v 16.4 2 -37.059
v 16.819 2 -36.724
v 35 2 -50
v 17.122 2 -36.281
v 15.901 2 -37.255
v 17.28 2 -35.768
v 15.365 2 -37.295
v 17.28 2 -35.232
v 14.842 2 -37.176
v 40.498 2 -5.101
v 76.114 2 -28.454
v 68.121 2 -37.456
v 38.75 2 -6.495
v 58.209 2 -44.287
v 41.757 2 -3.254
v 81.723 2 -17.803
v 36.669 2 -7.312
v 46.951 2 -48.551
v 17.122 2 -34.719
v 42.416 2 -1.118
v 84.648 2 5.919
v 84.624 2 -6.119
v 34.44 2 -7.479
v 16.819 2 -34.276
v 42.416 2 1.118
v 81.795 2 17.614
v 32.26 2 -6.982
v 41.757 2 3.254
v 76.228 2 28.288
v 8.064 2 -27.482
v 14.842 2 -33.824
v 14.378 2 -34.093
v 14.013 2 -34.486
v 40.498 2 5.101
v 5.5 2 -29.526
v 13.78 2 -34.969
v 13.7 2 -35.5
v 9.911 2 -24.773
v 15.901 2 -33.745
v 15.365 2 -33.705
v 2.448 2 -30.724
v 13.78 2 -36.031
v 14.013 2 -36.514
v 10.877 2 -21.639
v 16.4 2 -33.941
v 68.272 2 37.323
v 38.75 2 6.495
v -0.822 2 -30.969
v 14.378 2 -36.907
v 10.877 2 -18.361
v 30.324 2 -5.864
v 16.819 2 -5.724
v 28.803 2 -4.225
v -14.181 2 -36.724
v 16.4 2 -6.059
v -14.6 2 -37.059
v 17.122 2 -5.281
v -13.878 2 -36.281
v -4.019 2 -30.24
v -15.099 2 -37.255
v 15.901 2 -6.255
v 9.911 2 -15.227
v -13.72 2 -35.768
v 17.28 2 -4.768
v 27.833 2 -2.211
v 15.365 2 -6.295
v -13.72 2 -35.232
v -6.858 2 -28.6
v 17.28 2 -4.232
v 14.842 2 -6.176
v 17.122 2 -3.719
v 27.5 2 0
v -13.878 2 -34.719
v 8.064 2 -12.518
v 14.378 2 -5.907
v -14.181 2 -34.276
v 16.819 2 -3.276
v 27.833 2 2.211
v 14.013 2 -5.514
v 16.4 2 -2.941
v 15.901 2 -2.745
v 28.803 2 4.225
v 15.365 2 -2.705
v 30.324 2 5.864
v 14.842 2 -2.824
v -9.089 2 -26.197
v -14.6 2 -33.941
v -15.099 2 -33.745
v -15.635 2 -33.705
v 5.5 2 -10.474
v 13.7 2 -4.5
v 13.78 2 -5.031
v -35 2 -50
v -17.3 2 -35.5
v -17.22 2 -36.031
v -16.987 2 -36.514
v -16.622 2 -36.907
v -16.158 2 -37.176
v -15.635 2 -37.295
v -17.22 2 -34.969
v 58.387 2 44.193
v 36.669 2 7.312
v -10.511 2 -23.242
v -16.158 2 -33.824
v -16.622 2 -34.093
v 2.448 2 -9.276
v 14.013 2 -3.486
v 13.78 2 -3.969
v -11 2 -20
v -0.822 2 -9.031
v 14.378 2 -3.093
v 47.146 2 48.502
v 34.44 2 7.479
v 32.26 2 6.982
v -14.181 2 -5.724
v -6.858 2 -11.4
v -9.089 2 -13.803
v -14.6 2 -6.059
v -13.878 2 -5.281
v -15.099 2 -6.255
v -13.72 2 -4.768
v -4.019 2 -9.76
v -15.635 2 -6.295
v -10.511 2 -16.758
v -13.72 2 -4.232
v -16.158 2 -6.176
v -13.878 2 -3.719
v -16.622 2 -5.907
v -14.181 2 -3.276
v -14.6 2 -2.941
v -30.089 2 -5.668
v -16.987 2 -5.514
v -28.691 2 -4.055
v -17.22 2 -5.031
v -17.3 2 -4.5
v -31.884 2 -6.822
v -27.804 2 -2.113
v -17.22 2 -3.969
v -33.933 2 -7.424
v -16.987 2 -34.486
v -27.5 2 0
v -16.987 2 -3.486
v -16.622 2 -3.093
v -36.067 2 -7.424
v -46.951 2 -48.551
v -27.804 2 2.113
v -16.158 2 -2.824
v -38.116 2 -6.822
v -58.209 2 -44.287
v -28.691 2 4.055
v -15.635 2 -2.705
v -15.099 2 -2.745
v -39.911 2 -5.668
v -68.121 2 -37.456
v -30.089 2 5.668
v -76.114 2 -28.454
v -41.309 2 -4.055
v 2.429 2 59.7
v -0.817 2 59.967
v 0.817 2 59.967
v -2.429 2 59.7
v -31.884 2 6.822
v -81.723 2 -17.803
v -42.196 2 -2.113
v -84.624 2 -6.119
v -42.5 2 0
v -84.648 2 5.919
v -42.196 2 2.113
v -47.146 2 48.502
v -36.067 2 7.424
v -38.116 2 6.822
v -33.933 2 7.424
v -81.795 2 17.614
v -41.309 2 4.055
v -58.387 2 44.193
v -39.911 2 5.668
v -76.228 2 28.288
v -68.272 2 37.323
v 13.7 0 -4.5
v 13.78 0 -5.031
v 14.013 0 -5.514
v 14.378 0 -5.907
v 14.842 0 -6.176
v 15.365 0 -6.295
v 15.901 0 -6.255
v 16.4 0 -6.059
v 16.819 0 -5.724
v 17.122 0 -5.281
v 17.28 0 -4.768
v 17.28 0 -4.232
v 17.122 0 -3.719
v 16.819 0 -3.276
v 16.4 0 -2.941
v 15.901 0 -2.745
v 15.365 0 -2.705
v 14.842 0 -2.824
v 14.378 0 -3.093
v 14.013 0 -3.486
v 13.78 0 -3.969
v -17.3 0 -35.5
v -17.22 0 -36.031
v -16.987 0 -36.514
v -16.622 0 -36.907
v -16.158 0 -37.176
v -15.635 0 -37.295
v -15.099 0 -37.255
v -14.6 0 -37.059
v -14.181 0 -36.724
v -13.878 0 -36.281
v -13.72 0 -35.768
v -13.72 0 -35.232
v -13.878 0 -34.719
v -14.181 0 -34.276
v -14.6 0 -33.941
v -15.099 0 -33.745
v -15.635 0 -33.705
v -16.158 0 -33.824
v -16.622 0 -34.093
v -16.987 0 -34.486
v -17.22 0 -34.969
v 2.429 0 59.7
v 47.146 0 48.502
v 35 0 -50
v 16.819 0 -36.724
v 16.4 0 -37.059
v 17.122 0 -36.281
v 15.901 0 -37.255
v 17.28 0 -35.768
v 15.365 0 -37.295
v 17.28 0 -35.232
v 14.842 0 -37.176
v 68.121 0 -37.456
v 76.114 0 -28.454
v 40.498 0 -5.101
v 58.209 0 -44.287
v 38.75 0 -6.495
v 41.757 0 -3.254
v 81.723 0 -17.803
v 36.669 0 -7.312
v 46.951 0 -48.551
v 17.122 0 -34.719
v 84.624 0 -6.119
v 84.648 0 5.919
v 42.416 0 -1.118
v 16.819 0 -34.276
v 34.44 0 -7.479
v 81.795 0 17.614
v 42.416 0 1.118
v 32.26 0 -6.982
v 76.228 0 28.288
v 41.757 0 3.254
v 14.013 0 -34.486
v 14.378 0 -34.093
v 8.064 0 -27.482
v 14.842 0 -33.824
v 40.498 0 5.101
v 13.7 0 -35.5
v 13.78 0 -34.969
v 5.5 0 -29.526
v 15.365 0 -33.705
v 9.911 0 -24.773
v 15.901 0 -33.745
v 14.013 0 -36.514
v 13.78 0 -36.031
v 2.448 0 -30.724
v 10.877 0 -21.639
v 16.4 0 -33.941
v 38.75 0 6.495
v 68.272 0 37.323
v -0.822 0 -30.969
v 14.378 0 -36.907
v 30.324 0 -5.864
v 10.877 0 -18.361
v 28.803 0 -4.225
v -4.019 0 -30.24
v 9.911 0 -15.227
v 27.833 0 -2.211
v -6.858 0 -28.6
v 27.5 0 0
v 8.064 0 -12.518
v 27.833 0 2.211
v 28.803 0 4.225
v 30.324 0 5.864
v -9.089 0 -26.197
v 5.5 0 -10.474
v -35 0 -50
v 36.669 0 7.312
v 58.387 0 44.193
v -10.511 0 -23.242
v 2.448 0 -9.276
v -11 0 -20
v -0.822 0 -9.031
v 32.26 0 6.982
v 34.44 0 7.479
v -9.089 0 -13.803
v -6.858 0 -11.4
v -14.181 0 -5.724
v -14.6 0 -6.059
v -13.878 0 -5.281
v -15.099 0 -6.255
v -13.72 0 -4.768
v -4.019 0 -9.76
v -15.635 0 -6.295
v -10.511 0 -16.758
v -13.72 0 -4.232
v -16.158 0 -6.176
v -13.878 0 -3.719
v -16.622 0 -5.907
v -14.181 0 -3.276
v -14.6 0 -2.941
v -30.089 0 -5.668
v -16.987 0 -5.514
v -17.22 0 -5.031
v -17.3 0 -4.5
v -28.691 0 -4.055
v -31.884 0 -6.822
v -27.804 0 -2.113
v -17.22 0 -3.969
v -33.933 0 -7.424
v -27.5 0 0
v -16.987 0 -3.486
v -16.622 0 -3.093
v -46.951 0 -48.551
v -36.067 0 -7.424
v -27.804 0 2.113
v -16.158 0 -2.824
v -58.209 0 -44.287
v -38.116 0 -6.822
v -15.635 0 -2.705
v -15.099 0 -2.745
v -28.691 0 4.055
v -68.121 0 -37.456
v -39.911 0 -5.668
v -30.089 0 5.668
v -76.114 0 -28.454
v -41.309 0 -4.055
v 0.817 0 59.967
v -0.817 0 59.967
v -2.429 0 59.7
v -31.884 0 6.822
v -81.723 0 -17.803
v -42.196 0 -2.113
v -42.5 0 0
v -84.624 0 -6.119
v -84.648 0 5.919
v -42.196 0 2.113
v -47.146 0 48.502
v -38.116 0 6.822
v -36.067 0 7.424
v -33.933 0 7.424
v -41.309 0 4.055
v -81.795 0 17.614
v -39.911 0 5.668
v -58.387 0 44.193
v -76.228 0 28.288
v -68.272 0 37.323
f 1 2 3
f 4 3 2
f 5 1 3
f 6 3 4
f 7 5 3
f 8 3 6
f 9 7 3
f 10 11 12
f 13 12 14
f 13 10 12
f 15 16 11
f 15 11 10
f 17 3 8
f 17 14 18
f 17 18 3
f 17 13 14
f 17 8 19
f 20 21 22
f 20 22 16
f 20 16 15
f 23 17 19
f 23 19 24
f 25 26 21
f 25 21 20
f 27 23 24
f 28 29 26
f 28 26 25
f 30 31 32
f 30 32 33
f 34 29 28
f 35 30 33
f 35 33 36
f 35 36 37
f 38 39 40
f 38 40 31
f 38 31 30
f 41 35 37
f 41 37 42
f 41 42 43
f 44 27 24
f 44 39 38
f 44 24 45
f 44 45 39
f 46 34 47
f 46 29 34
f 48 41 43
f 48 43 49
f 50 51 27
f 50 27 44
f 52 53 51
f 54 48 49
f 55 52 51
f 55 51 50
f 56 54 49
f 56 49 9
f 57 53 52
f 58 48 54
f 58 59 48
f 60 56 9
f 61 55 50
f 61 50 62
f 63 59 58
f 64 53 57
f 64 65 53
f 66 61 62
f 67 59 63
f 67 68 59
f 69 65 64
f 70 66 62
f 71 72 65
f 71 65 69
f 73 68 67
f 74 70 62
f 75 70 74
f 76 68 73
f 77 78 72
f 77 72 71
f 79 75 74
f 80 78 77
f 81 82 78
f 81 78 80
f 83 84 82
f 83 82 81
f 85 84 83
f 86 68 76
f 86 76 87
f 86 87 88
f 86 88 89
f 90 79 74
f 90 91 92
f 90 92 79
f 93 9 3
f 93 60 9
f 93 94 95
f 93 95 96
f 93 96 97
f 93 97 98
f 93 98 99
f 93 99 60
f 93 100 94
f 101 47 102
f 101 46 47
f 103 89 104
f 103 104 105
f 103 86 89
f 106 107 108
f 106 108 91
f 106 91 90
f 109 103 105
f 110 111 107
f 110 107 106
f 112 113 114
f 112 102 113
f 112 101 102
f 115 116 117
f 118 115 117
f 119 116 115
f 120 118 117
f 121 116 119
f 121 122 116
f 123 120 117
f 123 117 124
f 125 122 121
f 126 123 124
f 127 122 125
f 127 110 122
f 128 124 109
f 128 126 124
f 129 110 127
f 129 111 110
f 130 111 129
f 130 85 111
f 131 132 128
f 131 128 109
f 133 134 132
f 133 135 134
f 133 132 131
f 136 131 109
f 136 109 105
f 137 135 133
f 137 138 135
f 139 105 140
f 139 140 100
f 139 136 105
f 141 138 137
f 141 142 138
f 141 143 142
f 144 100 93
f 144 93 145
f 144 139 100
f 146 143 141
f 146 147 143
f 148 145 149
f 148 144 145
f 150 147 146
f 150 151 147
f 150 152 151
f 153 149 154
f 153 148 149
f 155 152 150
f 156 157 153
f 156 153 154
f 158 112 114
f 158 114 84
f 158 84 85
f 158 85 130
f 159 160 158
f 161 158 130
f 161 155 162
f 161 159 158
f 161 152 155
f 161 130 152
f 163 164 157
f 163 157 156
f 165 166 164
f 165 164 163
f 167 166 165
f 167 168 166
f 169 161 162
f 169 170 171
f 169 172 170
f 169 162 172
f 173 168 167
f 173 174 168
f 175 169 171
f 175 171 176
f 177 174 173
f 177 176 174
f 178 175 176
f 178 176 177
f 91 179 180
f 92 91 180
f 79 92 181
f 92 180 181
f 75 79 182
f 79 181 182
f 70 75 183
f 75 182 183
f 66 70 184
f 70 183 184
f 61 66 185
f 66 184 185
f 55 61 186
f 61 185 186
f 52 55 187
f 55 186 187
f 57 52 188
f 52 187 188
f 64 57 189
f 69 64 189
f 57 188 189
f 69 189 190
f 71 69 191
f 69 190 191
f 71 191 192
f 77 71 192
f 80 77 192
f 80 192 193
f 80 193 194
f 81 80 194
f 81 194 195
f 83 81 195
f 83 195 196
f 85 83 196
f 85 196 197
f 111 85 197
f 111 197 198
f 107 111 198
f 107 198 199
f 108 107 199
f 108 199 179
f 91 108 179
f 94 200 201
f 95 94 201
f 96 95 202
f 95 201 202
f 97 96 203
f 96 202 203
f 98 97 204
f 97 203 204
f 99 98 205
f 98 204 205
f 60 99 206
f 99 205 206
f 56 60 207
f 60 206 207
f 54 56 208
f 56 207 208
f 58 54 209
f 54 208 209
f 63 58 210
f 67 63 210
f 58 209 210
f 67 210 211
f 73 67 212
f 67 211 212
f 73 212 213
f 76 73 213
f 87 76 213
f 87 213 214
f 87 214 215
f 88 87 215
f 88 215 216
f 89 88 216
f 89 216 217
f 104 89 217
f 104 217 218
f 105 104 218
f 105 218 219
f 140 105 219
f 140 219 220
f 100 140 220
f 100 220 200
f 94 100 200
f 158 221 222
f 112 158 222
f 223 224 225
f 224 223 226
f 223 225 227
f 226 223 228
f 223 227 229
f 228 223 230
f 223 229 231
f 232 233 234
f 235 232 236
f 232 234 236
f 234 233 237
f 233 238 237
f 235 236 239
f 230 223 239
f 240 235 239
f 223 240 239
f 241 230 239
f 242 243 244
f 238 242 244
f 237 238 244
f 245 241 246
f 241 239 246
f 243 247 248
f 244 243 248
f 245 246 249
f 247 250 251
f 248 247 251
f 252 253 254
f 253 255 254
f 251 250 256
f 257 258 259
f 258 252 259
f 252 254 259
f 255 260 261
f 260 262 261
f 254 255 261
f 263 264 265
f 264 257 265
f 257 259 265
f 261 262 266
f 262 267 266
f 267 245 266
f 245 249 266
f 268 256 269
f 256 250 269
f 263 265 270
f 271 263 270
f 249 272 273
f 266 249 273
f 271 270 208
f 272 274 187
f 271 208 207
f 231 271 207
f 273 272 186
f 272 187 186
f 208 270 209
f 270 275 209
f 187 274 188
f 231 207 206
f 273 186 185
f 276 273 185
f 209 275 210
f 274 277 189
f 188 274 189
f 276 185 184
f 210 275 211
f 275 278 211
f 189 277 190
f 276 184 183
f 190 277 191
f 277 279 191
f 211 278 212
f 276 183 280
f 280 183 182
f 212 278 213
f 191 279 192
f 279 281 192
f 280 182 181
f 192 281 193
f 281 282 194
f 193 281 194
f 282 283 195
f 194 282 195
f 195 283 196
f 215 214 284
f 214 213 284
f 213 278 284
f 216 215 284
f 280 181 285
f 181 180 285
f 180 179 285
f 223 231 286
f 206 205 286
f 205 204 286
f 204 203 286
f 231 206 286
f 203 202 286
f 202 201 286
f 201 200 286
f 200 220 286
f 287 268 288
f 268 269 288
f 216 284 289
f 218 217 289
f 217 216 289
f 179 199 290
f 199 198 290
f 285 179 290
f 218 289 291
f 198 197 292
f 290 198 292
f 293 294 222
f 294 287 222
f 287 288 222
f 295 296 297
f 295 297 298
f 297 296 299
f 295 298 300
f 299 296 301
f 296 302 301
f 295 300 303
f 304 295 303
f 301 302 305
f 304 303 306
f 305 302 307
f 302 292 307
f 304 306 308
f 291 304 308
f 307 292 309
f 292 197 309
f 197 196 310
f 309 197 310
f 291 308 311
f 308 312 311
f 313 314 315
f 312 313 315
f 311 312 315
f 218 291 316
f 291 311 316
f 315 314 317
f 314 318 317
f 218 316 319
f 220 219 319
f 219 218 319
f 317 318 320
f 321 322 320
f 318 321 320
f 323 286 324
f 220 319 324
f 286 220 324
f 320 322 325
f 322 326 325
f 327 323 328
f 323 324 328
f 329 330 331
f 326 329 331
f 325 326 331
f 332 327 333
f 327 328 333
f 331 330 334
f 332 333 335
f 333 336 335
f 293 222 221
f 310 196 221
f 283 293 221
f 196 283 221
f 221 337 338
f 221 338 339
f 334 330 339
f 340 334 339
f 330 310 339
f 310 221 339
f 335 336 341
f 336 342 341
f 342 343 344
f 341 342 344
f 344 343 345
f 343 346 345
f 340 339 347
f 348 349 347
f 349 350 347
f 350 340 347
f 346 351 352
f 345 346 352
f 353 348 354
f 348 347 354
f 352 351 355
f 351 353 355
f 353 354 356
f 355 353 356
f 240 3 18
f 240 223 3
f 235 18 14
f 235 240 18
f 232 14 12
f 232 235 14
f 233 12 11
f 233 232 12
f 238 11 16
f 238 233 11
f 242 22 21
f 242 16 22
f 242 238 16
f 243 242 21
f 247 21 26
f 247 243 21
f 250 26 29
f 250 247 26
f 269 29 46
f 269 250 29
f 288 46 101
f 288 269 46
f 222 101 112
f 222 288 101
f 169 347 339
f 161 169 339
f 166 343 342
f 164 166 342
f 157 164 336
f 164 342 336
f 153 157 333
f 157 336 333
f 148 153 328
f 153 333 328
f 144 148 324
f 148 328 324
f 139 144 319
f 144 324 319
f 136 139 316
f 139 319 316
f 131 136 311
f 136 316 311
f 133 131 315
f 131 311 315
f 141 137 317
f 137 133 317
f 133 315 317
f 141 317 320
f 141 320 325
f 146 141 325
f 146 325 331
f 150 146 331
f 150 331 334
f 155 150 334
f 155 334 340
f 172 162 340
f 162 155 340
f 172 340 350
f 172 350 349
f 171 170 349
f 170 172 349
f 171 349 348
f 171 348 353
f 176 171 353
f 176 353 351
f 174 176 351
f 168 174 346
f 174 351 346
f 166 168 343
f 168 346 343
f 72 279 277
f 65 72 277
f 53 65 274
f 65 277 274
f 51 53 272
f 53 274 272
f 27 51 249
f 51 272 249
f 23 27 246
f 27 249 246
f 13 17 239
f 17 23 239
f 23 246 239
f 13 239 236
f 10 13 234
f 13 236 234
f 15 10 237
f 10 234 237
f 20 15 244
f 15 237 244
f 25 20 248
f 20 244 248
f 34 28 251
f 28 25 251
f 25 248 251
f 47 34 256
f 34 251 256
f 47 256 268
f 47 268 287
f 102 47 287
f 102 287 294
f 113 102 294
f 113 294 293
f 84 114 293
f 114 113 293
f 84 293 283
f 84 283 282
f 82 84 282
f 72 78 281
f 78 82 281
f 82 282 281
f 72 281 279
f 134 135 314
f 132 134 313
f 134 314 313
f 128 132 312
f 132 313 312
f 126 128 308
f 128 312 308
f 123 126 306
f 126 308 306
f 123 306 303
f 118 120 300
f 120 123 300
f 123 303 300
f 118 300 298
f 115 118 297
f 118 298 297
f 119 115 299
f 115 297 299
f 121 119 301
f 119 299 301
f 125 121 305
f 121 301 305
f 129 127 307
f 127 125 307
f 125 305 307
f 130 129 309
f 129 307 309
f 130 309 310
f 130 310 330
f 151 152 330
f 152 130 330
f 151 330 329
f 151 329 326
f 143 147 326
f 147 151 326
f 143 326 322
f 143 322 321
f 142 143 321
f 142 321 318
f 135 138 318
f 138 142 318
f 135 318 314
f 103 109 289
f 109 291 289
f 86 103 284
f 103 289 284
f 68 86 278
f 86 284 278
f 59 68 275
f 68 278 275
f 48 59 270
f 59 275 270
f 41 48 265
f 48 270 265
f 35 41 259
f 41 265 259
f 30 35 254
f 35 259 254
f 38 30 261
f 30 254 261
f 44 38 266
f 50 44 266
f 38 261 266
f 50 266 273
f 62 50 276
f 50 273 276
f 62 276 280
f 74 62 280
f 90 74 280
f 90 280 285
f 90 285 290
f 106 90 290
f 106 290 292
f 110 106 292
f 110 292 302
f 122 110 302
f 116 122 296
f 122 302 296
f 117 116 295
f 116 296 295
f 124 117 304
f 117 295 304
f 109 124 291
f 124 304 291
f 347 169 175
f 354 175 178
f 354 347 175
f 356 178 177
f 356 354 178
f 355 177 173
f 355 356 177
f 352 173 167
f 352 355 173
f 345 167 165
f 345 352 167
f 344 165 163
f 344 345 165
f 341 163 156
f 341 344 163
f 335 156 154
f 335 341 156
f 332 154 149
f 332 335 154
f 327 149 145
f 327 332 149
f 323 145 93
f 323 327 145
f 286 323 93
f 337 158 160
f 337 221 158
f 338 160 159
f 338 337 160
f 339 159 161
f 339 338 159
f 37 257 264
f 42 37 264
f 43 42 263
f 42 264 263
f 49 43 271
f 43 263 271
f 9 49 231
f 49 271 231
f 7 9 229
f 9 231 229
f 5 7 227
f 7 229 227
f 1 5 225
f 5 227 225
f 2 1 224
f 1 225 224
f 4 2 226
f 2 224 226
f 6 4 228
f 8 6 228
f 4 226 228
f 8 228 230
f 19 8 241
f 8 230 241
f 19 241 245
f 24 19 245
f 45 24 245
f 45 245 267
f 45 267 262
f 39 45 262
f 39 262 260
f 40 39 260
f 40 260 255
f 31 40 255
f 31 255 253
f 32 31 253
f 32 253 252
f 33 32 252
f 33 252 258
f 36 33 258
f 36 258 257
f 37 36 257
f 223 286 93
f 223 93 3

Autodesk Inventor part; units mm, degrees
ref_plane "YZ Plane" through (0, 0, 0) normal (1, 0, 0) x (0, 1, 0)
ref_plane "XZ Plane" through (0, 0, 0) normal (0, 1, 0) x (-1, 0, 0)
ref_plane "XY Plane" through (0, 0, 0) normal (0, 0, 1) x (1, 0, 0)
sketch "Sketch1" plane through (0, 0, 0) normal (0, 1, 0) x (-1, 0, 0)
  line L0 (35, 0) -> (-35, 0)
  circle A0 centre (-35, 0) radius 7.5
  circle A1 centre (35, 0) radius 7.5
  circle A2 centre (35, 0) radius 50
  circle A3 centre (-35, 0) radius 50
  line L1 (35, -50) -> (-35, -50)
  line L2 (0, -50) -> (0, -35.5)
  line L3 (15.5, -35.5) -> (-15.5, -35.5)
  line L4 (15.5, -35.5) -> (-15.5, -35.5)
  line L5 (-15.5, -35.5) -> (-15.5, -4.5)
  line L6 (-15.5, -4.5) -> (15.5, -4.5)
  line L7 (15.5, -4.5) -> (15.5, -35.5)
  circle A4 centre (15.5, -35.5) radius 1.8
  circle A5 centre (-15.5, -35.5) radius 1.8
  circle A6 centre (-15.5, -4.5) radius 1.8
  circle A7 centre (15.5, -4.5) radius 1.8
  line L8 (15.5, -35.5) -> (-15.5, -4.5)
  line L9 (-15.5, -4.5) -> (-15.5, -35.5)
  line L10 (-15.5, -35.5) -> (15.5, -4.5)
  circle A8 centre (0, -20) radius 11
  line L11 (0, 0) -> (0, 50)
  circle A9 centre (0, 50) radius 10
  line L12 (47.1461, 48.5023) -> (2.4292, 59.7005)
  line L13 (-2.4292, 59.7005) -> (-47.1461, 48.5023)
  point P0 (0, 35.7071)
  dimension "d0" = 70
  dimension "d1" = 15
  dimension "d2" = 15
  dimension "d3" = 100
  dimension "d4" = 100
  dimension "d5" = 14.5
  dimension "d6" = 31
  dimension "d7" = 31
  dimension "d8" = 3.6
  dimension "d9" = 3.6
  dimension "d10" = 3.6
  dimension "d11" = 3.6
  dimension "d14" = 22
  dimension "d15" = 50
  dimension "d16" = 20
extrude "Extrusion1" add sketch "Sketch1" along normal blind 2 contours A3 A7 L6 A6 A2 L0 | L0 L11 A3 | A3 A2 L3 A4 L7 A7 | L0 A2 L11 | L11 A9 L12 A2 | A2 A6 L5 A5 L3 A3 | A3 L13 A9 L11 | A9 | A7 L10 A8 L8 A6 L6 | A3 L2 L1 | L7 A4 L8 A8 A3 A7 | A7 A3 A8 L10 | A6 A2 A8 L10 A5 L5 | L1 L2 A2 | L2 L3 A3 | A2 L3 L2 | L8 A8 A2 A6 | L3 A5 L10 A8 A2 | A2 A8 A3 L3 | A3 A8 L8 A4 L3
properties part number "Extruder Frame"
